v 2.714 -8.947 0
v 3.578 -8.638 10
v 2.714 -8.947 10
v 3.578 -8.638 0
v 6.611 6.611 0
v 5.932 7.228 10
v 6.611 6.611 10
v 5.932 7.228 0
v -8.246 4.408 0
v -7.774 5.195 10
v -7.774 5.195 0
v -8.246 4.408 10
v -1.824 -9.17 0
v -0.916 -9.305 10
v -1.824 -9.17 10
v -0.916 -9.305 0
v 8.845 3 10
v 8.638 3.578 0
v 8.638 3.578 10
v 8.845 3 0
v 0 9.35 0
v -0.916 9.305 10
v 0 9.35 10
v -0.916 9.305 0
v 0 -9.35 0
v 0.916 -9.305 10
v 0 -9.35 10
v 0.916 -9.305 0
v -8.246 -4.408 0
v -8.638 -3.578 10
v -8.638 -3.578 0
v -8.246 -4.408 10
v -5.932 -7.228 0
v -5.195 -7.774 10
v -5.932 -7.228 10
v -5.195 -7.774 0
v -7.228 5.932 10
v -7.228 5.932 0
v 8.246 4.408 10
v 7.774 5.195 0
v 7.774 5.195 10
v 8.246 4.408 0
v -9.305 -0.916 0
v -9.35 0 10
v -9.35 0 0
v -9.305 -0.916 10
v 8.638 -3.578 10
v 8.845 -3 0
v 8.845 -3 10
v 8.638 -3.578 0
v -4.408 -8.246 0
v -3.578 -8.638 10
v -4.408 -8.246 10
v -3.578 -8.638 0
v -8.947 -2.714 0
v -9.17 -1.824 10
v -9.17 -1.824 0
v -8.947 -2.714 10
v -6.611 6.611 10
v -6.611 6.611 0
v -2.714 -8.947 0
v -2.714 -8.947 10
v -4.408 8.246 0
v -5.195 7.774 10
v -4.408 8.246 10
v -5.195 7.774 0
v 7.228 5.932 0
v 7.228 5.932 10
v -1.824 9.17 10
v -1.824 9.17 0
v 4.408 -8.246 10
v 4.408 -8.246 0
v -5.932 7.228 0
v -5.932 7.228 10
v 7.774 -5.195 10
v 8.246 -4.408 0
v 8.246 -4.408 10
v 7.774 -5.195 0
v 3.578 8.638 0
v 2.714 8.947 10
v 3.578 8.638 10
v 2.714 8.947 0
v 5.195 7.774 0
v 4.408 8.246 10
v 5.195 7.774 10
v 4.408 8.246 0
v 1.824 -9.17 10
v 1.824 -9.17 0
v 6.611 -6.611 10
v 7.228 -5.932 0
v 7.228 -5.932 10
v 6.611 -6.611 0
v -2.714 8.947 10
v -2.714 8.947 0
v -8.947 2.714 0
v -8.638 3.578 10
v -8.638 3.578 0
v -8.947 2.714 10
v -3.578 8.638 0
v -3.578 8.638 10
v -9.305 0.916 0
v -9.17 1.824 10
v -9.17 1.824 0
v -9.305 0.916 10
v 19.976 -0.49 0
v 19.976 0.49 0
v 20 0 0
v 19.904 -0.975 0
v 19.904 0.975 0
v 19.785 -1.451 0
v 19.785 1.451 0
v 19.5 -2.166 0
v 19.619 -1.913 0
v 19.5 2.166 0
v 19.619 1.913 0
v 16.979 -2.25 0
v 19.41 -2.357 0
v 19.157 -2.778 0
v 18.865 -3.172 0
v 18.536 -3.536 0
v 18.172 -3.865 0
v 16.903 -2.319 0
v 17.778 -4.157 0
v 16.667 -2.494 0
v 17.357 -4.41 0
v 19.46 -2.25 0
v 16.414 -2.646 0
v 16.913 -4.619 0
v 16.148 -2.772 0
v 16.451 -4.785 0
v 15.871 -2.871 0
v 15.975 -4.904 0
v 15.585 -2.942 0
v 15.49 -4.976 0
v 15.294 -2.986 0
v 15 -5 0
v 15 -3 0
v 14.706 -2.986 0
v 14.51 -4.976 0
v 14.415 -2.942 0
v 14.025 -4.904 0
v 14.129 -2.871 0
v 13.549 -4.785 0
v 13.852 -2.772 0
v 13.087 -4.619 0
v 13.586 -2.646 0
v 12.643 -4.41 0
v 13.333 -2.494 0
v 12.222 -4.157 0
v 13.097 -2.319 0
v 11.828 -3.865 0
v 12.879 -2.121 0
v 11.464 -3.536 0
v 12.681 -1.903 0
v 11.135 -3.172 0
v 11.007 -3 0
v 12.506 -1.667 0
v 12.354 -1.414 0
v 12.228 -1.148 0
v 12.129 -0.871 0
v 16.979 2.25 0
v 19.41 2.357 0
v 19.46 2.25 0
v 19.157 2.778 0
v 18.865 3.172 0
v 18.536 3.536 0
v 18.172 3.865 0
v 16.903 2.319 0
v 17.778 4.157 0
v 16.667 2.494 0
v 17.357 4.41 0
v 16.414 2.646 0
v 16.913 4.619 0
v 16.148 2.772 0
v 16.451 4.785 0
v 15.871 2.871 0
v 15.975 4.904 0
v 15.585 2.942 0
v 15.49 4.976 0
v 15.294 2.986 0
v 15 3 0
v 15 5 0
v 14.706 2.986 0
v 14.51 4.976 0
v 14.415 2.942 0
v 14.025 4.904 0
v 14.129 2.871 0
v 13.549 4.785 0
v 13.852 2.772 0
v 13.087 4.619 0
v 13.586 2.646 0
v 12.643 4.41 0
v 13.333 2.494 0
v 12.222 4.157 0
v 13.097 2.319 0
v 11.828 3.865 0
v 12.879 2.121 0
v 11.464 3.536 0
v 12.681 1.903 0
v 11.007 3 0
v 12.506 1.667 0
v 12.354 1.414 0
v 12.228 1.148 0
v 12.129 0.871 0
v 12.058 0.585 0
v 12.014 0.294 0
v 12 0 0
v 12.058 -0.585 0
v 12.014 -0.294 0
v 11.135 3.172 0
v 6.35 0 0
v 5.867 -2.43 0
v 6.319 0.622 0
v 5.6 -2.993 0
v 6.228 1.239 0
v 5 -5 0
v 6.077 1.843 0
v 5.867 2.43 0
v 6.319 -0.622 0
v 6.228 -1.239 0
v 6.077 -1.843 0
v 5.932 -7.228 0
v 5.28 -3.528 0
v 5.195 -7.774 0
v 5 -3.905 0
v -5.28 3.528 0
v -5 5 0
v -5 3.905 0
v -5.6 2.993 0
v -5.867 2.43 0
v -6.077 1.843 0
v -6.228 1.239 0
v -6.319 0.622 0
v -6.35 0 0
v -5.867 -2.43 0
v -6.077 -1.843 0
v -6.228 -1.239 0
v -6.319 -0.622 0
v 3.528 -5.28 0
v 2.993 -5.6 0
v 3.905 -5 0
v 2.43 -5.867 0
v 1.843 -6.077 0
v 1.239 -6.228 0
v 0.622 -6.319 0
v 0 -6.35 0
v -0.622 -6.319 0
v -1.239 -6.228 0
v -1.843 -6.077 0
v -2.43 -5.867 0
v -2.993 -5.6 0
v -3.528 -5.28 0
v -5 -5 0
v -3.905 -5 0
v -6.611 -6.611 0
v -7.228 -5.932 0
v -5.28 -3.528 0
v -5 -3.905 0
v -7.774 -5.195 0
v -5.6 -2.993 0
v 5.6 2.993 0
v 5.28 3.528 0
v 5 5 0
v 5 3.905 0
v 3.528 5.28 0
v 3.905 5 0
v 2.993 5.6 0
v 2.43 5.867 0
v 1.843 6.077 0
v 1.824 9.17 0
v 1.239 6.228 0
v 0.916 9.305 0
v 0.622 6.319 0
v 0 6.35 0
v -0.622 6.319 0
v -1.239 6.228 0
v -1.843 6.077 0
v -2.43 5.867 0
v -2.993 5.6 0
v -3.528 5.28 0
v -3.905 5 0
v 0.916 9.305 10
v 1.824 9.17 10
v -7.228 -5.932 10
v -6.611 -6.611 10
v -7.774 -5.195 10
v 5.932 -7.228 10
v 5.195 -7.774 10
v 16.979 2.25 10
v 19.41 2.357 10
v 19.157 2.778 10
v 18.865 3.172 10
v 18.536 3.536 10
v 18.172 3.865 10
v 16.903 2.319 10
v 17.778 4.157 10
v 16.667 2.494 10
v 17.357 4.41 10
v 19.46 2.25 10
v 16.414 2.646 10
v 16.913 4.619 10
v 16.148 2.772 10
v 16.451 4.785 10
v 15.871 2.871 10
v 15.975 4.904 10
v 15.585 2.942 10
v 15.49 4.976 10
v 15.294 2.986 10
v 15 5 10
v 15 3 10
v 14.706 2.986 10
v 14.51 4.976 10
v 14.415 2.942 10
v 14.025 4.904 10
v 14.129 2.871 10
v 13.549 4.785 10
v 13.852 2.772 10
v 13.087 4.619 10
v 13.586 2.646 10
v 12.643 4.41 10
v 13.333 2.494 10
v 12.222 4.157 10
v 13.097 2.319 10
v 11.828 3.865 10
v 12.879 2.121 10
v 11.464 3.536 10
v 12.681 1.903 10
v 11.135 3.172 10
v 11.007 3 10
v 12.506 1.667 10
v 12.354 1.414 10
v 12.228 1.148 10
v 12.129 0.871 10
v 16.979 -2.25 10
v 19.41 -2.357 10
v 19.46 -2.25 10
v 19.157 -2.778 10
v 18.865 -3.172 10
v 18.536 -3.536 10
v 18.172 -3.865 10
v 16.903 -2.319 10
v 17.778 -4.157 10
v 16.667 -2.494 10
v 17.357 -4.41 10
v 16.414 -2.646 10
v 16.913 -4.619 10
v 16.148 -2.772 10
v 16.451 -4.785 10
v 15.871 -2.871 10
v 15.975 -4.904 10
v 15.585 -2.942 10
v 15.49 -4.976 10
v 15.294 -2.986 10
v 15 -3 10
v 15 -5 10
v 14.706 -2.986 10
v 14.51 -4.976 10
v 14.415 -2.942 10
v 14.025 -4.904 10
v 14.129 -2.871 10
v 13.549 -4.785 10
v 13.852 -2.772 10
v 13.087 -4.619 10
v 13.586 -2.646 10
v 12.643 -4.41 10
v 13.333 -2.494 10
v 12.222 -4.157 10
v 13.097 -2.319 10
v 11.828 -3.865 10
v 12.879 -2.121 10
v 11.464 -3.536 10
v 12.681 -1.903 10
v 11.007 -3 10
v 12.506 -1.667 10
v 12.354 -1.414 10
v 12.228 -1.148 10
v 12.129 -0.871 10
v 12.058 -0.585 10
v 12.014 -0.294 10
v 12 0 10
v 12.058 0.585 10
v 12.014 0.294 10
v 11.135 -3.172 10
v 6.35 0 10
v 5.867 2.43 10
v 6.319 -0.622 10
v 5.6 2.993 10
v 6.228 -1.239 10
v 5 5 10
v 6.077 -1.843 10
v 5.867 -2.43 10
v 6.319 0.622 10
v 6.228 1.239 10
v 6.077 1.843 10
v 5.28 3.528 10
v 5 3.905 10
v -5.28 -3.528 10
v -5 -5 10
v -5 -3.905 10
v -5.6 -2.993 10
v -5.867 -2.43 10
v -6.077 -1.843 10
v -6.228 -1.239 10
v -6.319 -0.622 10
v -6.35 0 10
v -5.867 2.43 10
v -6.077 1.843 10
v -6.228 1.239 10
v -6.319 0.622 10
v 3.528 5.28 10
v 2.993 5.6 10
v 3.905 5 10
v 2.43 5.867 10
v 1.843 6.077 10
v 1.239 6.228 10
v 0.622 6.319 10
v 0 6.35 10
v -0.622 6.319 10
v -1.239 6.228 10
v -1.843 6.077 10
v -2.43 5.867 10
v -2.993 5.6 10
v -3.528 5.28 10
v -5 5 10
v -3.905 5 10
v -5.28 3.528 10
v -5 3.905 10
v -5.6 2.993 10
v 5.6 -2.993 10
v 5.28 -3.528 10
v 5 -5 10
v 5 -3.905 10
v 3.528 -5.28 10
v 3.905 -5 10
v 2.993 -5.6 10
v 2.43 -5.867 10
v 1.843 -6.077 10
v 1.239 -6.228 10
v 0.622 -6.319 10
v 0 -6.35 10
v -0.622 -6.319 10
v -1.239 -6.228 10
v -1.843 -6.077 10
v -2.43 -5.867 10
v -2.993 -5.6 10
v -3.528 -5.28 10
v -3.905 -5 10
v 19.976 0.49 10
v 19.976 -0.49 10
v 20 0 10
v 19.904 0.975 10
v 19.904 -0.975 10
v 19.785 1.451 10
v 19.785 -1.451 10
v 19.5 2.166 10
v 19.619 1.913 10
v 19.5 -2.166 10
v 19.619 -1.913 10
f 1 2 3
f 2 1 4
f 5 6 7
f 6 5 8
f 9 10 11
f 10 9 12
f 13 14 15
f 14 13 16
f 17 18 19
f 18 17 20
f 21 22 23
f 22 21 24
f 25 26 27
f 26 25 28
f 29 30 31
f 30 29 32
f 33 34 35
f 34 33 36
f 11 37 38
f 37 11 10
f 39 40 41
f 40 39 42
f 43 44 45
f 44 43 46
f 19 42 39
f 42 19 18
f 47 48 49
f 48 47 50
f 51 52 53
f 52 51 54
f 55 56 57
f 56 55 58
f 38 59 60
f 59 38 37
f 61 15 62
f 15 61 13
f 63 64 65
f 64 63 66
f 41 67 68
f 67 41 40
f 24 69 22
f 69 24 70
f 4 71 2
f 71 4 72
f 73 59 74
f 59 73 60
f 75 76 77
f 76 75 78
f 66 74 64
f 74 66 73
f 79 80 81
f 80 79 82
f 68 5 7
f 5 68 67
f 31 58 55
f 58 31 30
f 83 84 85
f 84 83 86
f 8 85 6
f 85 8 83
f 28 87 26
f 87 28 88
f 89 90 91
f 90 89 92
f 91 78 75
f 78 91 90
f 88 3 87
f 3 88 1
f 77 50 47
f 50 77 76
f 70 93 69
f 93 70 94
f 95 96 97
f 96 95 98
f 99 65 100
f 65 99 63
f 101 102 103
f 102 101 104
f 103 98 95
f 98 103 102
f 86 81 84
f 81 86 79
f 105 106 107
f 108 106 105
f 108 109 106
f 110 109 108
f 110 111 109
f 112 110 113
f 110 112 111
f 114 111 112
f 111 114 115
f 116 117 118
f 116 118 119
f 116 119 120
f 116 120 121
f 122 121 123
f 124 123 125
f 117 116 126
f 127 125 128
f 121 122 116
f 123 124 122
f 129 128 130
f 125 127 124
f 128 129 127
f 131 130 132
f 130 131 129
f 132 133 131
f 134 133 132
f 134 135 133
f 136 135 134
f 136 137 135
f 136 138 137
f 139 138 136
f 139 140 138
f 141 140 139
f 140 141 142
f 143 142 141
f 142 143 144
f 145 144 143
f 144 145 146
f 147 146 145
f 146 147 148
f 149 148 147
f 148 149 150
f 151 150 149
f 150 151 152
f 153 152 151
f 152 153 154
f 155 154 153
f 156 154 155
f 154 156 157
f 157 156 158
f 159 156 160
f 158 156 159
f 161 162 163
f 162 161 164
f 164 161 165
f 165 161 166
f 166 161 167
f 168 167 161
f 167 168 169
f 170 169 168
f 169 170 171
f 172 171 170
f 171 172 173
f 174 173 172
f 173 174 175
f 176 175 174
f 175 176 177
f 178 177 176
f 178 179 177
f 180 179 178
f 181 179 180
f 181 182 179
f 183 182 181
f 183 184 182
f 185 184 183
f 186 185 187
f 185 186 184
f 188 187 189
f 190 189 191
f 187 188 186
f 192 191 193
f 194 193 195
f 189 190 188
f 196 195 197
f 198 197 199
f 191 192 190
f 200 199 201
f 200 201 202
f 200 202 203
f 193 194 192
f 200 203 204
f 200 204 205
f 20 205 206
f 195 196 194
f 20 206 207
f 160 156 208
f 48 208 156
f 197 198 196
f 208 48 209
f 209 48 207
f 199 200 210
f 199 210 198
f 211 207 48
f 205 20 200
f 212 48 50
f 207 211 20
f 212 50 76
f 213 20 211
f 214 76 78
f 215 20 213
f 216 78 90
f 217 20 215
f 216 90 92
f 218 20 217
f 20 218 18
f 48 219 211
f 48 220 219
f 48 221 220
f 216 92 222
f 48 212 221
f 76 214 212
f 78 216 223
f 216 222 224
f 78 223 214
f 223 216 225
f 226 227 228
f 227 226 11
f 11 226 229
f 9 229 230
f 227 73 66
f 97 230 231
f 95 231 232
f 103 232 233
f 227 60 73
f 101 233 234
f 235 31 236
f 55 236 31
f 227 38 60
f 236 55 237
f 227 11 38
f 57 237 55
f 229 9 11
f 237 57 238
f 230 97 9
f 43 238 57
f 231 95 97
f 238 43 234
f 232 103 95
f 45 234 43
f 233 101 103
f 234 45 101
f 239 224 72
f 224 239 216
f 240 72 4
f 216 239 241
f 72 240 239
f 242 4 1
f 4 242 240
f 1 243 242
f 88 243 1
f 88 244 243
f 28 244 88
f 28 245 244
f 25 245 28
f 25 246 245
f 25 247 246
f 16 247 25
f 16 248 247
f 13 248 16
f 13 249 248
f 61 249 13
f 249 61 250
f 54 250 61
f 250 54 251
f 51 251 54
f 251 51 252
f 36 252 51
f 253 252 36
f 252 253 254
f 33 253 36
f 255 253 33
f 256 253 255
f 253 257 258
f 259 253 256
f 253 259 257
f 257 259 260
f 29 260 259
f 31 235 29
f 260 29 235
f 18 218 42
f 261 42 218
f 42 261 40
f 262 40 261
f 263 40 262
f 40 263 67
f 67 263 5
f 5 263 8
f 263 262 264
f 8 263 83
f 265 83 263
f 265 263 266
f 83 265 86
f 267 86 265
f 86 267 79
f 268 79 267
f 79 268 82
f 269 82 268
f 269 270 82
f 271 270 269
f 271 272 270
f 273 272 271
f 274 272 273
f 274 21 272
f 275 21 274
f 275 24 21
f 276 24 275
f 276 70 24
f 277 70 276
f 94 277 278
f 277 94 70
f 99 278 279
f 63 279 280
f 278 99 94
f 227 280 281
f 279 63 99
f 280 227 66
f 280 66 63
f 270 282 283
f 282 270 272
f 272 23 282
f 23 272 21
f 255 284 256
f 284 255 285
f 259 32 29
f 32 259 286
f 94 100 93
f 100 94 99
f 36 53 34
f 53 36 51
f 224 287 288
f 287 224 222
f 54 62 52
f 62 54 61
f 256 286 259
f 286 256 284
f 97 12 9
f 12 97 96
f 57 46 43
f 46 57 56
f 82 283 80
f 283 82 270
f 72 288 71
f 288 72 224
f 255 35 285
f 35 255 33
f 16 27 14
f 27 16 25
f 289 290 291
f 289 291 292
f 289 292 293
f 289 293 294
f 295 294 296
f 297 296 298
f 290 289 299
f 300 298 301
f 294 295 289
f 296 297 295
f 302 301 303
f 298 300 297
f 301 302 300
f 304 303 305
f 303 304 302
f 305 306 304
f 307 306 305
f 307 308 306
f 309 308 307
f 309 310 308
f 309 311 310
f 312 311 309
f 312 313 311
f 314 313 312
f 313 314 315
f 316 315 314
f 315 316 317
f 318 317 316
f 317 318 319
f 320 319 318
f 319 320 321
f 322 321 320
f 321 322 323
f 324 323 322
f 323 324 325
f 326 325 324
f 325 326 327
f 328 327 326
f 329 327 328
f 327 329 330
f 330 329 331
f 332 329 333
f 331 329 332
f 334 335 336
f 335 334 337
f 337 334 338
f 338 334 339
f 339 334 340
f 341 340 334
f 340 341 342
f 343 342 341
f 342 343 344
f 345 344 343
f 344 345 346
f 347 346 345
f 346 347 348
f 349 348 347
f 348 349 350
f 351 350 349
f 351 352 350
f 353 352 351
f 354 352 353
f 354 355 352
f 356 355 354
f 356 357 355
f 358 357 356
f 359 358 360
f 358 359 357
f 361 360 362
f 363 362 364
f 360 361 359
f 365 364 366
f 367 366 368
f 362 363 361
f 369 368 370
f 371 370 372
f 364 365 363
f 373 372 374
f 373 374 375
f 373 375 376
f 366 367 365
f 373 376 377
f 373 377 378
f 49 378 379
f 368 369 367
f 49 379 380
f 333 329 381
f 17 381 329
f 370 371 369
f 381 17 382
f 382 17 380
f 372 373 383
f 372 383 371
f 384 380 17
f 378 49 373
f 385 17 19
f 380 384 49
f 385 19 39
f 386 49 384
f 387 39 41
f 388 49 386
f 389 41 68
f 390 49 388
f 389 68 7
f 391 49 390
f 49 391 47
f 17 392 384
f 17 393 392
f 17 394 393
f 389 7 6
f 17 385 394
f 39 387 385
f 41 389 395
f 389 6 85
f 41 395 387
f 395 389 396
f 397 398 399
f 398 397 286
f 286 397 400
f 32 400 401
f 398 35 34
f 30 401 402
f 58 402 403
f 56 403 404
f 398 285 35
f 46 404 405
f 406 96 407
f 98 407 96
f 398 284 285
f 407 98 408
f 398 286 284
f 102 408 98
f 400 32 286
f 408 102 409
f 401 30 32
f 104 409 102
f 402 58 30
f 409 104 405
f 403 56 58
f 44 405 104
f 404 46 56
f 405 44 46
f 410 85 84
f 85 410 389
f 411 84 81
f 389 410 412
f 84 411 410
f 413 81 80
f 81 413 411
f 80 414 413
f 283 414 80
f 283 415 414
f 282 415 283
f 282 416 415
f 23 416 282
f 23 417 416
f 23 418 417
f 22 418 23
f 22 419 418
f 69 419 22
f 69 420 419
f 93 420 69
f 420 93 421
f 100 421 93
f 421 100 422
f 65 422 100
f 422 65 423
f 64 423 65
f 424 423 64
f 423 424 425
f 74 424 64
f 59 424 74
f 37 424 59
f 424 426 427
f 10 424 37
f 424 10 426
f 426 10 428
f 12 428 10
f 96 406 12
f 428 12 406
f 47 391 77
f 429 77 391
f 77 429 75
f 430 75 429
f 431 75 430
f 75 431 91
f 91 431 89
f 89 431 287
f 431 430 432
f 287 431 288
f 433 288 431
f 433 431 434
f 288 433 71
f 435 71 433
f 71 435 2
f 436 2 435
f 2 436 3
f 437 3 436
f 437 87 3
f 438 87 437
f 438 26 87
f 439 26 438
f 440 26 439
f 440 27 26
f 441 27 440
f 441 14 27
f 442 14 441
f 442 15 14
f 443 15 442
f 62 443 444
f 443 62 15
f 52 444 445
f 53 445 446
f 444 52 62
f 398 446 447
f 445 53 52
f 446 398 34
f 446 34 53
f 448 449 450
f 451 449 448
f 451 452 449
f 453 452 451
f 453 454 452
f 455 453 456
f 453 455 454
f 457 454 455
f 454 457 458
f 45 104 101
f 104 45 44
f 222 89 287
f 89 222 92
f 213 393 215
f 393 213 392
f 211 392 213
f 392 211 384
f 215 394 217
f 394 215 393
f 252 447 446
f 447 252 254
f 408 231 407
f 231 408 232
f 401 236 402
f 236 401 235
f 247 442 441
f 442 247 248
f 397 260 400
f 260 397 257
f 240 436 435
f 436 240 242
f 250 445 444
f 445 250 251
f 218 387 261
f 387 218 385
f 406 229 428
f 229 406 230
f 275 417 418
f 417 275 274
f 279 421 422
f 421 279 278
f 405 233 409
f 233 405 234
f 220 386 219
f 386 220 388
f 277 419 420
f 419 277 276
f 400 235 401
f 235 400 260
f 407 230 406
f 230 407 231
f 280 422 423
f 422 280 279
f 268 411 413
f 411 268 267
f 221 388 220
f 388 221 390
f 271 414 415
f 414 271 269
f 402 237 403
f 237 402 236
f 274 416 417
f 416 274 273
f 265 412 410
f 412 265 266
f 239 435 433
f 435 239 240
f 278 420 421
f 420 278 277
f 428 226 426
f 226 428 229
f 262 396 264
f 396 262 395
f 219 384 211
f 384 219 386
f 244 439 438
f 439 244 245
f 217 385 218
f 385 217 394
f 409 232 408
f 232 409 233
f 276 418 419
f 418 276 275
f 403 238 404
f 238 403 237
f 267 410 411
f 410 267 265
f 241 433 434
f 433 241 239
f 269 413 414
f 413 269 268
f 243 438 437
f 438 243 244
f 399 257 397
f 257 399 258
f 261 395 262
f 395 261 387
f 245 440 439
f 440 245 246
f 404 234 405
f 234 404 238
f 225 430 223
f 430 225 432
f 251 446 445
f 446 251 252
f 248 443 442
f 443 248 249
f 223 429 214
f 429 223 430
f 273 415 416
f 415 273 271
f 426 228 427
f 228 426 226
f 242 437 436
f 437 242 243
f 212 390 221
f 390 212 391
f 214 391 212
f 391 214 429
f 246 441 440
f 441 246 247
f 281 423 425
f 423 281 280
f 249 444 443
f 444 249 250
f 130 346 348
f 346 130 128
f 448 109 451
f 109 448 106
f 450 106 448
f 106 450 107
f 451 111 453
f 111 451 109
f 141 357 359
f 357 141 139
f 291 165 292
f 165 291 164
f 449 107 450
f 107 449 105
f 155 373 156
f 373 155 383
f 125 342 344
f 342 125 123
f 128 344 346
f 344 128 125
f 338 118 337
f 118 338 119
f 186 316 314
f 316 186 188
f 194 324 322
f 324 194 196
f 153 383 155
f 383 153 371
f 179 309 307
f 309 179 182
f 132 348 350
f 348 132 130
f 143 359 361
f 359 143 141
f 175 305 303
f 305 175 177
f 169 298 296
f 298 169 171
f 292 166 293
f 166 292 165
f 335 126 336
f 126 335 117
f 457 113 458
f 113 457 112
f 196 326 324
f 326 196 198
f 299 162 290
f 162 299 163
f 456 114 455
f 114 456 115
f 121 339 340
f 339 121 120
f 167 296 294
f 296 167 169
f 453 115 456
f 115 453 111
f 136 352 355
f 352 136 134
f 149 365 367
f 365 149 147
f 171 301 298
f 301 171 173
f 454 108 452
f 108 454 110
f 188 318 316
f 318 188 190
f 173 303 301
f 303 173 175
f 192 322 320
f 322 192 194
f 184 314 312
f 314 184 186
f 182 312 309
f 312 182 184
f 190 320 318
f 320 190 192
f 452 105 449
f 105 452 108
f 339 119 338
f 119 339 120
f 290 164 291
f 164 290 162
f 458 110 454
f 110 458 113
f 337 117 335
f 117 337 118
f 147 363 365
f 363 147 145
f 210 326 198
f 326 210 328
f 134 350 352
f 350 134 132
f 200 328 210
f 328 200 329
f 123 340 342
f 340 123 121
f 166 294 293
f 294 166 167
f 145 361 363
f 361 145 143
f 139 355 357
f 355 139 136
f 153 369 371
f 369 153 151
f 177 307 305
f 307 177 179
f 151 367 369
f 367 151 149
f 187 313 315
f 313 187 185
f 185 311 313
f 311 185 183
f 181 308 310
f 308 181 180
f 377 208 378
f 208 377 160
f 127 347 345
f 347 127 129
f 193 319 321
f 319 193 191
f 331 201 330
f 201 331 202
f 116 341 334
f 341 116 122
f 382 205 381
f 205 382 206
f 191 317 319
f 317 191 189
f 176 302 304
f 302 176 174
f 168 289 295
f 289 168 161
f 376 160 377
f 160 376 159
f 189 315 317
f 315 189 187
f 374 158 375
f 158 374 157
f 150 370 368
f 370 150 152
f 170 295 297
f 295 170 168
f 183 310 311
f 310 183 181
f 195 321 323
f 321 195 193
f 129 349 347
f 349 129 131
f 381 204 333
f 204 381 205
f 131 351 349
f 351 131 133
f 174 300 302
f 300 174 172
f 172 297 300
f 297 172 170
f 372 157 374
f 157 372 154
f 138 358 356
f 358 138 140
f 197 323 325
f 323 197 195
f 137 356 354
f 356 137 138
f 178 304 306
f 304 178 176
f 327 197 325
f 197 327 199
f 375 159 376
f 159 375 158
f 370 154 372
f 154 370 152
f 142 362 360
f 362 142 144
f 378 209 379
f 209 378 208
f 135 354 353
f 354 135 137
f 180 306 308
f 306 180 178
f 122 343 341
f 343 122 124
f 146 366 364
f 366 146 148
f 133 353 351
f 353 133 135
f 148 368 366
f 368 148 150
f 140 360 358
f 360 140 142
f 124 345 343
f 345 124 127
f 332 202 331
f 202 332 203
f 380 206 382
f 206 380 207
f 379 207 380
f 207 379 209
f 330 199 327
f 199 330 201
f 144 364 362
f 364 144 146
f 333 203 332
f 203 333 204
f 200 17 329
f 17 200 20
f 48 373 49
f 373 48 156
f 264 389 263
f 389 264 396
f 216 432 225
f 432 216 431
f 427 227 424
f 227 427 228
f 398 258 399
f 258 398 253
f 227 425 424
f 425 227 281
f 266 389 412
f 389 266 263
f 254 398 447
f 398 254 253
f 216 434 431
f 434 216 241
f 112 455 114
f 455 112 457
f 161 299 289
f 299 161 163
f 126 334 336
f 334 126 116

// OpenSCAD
// Snap-on clip for lab stand rod and tubing.
// Printed flat: 10 mm tall extrusion (Z) of a 2-D profile in the XY plane.
// Orientation: Rests on XY plane at z=0, builds upward. Centred on origin.

// Rod dimensions
rod_id = 12.7;      // Inner diameter of rod ring
rod_wall = 3;       // Wall thickness of rod ring
rod_od = rod_id + 2 * rod_wall; // Outer diameter of rod ring (18.7)

// Tubing dimensions
tube_id = 6;        // Inner diameter of tubing ring
tube_wall = 2;      // Wall thickness of tubing ring
tube_od = tube_id + 2 * tube_wall; // Outer diameter of tubing ring (10)

// Bridge dimensions
bridge_x_start = 8; // Start X of bridge
bridge_x_end = 12;  // End X of bridge
bridge_y = 6;       // Width of bridge in Y

// Cutout dimensions
cutout_rod_width = 10; // Width of cutout on rod ring (-X side)
cutout_tube_width = 4.5; // Width of cutout on tubing ring (+X side)

// Extrusion height
height = 10;

$fn = 64;

// We will build the 2D profile as a union of three shapes (Rod Ring, Tubing Ring, Bridge)
// and then subtract the cutouts from this union.
// All shapes are defined in the XY plane.

// 1. Rod Ring (Full Ring)
// Center (0,0), OD = 18.7, ID = 12.7.
// We create this as a difference of two circles extruded, or a polygon.
// Using difference of circles is easier to define.
module rod_ring_full() {
    difference() {
        // Outer circle
        translate([0, 0, 0]) cylinder(h = height, d = rod_od);
        // Inner circle
        translate([0, 0, 0]) cylinder(h = height, d = rod_id);
    }
}

// 2. Tubing Ring (Full Ring)
// Center (15,0), OD = 10, ID = 6.
module tube_ring_full() {
    difference() {
        // Outer circle
        translate([15, 0, 0]) cylinder(h = height, d = tube_od);
        // Inner circle
        translate([15, 0, 0]) cylinder(h = height, d = tube_id);
    }
}

// 3. Bridge
// Rectangle from x=8 to x=12, y=-3 to y=3, height=10.
module bridge() {
    translate([bridge_x_start, -bridge_y / 2, 0]) cube([bridge_x_end - bridge_x_start, bridge_y, height]);
}

// 4. Cutouts (to be subtracted)
// Rod Cutout: x < 0, -5 < y < 5.
// This is a rectangle from x=-5 to x=0, y=-5 to y=5.
// We need to ensure it doesn't cut into the inner hole of the rod ring.
// Rod inner radius = 6.35. Cutout goes to x=0. Safe.
module rod_cutout() {
    translate([-cutout_rod_width / 2, -cutout_rod_width / 2, 0]) cube([cutout_rod_width, cutout_rod_width, height]);
}

// Tubing Cutout: x > 15, -2.25 < y < 2.25.
// This is a rectangle from x=15 to x=19.5, y=-2.25 to y=2.25.
// Tubing inner radius = 3. Center at 15. Inner edge at 12. Outer edge at 17.
// Cutout starts at 15, so it cuts into the ring material. Safe.
module tube_cutout() {
    translate([15, -cutout_tube_width / 2, 0]) cube([cutout_tube_width, cutout_tube_width, height]);
}

// Main assembly
difference() {
    union() {
        rod_ring_full();
        tube_ring_full();
        bridge();
    }
    rod_cutout();
    tube_cutout();
}
